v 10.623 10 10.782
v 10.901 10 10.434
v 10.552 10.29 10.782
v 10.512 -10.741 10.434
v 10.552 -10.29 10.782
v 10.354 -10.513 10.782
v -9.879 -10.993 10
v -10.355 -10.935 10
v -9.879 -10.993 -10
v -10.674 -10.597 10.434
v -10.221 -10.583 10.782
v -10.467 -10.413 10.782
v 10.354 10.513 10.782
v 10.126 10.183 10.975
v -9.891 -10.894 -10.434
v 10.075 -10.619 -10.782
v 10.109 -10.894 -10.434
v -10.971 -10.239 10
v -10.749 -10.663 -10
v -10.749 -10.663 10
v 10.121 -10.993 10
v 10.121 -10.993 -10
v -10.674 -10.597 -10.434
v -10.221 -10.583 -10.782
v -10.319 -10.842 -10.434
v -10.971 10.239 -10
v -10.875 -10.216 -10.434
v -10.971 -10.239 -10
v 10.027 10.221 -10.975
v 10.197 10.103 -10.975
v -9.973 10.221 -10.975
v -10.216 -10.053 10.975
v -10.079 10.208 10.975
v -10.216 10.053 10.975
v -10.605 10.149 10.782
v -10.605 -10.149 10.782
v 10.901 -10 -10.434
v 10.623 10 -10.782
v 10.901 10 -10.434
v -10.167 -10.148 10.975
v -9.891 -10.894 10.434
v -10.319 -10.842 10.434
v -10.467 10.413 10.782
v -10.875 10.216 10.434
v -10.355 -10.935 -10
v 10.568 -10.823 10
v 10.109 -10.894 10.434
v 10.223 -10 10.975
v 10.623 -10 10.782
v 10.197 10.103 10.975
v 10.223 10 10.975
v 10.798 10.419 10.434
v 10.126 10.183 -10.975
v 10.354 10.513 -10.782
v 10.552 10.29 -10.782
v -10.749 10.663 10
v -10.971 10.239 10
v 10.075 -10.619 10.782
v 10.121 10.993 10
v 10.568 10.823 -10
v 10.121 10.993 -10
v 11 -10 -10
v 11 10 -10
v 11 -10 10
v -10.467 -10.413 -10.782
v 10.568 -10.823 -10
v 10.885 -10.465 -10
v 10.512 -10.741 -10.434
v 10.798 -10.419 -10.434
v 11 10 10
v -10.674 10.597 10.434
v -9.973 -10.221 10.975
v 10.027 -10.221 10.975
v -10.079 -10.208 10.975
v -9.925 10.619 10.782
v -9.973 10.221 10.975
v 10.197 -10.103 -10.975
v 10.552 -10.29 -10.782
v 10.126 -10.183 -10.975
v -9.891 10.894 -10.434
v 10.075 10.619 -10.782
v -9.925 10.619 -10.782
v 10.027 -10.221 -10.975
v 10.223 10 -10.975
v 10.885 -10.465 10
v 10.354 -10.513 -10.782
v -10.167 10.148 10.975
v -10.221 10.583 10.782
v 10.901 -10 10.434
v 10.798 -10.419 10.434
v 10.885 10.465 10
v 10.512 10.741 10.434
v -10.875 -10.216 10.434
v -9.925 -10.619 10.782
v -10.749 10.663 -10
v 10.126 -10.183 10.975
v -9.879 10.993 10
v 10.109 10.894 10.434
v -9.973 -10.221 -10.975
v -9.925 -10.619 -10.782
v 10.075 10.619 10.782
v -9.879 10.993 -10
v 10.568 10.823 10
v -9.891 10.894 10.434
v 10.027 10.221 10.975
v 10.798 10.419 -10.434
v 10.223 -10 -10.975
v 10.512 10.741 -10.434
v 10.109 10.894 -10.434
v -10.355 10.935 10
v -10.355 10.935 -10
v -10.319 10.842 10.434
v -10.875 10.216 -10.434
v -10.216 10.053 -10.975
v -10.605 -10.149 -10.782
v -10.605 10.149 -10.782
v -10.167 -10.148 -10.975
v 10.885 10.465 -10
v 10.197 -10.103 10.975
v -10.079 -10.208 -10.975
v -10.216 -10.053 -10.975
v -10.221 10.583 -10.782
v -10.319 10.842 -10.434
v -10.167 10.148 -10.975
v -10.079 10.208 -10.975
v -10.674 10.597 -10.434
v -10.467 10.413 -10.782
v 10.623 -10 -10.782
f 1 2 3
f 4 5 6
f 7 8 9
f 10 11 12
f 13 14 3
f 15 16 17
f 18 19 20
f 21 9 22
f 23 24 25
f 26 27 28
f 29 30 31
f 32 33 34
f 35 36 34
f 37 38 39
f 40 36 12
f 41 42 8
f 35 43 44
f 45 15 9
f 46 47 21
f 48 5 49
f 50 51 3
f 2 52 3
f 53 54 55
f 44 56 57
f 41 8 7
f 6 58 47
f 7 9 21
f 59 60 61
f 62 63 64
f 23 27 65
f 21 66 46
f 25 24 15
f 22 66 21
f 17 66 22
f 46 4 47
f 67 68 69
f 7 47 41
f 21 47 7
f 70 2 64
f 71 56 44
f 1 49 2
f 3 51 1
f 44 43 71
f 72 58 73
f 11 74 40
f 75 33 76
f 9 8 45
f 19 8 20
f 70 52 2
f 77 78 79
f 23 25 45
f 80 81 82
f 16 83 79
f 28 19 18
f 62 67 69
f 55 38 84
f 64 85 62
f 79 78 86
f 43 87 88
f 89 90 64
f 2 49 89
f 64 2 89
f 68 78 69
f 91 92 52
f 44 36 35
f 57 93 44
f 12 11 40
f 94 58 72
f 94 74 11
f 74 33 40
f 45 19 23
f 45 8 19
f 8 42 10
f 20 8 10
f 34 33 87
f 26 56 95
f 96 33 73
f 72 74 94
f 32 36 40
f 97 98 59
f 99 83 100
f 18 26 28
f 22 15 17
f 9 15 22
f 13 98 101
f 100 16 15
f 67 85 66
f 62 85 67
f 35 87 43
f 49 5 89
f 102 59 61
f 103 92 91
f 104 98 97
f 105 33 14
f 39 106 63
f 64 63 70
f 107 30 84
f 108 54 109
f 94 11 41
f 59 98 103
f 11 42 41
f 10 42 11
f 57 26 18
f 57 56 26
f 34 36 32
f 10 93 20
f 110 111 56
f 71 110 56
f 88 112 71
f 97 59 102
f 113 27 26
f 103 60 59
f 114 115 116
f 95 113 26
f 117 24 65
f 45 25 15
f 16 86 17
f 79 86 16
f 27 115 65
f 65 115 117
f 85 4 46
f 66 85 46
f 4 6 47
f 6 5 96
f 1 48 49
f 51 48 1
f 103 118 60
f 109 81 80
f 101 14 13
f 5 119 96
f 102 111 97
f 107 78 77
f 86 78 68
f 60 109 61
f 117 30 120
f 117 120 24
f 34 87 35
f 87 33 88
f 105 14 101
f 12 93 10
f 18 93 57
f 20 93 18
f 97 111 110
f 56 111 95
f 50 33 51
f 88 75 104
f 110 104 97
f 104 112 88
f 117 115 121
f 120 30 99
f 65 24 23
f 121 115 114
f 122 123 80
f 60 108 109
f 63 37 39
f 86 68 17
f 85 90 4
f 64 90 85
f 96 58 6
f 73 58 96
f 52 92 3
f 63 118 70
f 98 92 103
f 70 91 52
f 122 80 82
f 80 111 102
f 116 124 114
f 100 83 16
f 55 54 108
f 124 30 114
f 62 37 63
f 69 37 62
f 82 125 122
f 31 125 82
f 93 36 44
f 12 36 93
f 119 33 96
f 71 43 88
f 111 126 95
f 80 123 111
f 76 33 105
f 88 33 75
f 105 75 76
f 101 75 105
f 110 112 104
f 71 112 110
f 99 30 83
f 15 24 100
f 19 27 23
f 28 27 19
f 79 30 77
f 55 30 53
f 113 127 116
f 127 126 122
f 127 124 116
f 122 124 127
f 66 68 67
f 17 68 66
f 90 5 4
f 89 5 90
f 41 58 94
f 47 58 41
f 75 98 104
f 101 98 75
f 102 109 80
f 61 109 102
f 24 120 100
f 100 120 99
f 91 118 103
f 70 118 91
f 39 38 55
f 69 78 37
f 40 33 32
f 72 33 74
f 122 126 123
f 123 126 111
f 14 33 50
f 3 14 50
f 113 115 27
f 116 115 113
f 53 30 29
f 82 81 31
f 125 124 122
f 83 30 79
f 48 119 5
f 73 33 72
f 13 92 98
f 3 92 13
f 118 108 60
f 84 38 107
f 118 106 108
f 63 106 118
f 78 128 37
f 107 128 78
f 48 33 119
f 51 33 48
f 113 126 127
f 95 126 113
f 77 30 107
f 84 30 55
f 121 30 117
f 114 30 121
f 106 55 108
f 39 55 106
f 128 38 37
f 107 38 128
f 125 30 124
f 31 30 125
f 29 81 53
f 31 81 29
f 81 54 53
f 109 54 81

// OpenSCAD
// No $fn on the sphere: facets come from $fa (file) and $fs (on the call).
$fa = 12;
minkowski() {
    cube([20, 20, 20], center = true);
    sphere(r = 1, $fs = 0.5);
}
